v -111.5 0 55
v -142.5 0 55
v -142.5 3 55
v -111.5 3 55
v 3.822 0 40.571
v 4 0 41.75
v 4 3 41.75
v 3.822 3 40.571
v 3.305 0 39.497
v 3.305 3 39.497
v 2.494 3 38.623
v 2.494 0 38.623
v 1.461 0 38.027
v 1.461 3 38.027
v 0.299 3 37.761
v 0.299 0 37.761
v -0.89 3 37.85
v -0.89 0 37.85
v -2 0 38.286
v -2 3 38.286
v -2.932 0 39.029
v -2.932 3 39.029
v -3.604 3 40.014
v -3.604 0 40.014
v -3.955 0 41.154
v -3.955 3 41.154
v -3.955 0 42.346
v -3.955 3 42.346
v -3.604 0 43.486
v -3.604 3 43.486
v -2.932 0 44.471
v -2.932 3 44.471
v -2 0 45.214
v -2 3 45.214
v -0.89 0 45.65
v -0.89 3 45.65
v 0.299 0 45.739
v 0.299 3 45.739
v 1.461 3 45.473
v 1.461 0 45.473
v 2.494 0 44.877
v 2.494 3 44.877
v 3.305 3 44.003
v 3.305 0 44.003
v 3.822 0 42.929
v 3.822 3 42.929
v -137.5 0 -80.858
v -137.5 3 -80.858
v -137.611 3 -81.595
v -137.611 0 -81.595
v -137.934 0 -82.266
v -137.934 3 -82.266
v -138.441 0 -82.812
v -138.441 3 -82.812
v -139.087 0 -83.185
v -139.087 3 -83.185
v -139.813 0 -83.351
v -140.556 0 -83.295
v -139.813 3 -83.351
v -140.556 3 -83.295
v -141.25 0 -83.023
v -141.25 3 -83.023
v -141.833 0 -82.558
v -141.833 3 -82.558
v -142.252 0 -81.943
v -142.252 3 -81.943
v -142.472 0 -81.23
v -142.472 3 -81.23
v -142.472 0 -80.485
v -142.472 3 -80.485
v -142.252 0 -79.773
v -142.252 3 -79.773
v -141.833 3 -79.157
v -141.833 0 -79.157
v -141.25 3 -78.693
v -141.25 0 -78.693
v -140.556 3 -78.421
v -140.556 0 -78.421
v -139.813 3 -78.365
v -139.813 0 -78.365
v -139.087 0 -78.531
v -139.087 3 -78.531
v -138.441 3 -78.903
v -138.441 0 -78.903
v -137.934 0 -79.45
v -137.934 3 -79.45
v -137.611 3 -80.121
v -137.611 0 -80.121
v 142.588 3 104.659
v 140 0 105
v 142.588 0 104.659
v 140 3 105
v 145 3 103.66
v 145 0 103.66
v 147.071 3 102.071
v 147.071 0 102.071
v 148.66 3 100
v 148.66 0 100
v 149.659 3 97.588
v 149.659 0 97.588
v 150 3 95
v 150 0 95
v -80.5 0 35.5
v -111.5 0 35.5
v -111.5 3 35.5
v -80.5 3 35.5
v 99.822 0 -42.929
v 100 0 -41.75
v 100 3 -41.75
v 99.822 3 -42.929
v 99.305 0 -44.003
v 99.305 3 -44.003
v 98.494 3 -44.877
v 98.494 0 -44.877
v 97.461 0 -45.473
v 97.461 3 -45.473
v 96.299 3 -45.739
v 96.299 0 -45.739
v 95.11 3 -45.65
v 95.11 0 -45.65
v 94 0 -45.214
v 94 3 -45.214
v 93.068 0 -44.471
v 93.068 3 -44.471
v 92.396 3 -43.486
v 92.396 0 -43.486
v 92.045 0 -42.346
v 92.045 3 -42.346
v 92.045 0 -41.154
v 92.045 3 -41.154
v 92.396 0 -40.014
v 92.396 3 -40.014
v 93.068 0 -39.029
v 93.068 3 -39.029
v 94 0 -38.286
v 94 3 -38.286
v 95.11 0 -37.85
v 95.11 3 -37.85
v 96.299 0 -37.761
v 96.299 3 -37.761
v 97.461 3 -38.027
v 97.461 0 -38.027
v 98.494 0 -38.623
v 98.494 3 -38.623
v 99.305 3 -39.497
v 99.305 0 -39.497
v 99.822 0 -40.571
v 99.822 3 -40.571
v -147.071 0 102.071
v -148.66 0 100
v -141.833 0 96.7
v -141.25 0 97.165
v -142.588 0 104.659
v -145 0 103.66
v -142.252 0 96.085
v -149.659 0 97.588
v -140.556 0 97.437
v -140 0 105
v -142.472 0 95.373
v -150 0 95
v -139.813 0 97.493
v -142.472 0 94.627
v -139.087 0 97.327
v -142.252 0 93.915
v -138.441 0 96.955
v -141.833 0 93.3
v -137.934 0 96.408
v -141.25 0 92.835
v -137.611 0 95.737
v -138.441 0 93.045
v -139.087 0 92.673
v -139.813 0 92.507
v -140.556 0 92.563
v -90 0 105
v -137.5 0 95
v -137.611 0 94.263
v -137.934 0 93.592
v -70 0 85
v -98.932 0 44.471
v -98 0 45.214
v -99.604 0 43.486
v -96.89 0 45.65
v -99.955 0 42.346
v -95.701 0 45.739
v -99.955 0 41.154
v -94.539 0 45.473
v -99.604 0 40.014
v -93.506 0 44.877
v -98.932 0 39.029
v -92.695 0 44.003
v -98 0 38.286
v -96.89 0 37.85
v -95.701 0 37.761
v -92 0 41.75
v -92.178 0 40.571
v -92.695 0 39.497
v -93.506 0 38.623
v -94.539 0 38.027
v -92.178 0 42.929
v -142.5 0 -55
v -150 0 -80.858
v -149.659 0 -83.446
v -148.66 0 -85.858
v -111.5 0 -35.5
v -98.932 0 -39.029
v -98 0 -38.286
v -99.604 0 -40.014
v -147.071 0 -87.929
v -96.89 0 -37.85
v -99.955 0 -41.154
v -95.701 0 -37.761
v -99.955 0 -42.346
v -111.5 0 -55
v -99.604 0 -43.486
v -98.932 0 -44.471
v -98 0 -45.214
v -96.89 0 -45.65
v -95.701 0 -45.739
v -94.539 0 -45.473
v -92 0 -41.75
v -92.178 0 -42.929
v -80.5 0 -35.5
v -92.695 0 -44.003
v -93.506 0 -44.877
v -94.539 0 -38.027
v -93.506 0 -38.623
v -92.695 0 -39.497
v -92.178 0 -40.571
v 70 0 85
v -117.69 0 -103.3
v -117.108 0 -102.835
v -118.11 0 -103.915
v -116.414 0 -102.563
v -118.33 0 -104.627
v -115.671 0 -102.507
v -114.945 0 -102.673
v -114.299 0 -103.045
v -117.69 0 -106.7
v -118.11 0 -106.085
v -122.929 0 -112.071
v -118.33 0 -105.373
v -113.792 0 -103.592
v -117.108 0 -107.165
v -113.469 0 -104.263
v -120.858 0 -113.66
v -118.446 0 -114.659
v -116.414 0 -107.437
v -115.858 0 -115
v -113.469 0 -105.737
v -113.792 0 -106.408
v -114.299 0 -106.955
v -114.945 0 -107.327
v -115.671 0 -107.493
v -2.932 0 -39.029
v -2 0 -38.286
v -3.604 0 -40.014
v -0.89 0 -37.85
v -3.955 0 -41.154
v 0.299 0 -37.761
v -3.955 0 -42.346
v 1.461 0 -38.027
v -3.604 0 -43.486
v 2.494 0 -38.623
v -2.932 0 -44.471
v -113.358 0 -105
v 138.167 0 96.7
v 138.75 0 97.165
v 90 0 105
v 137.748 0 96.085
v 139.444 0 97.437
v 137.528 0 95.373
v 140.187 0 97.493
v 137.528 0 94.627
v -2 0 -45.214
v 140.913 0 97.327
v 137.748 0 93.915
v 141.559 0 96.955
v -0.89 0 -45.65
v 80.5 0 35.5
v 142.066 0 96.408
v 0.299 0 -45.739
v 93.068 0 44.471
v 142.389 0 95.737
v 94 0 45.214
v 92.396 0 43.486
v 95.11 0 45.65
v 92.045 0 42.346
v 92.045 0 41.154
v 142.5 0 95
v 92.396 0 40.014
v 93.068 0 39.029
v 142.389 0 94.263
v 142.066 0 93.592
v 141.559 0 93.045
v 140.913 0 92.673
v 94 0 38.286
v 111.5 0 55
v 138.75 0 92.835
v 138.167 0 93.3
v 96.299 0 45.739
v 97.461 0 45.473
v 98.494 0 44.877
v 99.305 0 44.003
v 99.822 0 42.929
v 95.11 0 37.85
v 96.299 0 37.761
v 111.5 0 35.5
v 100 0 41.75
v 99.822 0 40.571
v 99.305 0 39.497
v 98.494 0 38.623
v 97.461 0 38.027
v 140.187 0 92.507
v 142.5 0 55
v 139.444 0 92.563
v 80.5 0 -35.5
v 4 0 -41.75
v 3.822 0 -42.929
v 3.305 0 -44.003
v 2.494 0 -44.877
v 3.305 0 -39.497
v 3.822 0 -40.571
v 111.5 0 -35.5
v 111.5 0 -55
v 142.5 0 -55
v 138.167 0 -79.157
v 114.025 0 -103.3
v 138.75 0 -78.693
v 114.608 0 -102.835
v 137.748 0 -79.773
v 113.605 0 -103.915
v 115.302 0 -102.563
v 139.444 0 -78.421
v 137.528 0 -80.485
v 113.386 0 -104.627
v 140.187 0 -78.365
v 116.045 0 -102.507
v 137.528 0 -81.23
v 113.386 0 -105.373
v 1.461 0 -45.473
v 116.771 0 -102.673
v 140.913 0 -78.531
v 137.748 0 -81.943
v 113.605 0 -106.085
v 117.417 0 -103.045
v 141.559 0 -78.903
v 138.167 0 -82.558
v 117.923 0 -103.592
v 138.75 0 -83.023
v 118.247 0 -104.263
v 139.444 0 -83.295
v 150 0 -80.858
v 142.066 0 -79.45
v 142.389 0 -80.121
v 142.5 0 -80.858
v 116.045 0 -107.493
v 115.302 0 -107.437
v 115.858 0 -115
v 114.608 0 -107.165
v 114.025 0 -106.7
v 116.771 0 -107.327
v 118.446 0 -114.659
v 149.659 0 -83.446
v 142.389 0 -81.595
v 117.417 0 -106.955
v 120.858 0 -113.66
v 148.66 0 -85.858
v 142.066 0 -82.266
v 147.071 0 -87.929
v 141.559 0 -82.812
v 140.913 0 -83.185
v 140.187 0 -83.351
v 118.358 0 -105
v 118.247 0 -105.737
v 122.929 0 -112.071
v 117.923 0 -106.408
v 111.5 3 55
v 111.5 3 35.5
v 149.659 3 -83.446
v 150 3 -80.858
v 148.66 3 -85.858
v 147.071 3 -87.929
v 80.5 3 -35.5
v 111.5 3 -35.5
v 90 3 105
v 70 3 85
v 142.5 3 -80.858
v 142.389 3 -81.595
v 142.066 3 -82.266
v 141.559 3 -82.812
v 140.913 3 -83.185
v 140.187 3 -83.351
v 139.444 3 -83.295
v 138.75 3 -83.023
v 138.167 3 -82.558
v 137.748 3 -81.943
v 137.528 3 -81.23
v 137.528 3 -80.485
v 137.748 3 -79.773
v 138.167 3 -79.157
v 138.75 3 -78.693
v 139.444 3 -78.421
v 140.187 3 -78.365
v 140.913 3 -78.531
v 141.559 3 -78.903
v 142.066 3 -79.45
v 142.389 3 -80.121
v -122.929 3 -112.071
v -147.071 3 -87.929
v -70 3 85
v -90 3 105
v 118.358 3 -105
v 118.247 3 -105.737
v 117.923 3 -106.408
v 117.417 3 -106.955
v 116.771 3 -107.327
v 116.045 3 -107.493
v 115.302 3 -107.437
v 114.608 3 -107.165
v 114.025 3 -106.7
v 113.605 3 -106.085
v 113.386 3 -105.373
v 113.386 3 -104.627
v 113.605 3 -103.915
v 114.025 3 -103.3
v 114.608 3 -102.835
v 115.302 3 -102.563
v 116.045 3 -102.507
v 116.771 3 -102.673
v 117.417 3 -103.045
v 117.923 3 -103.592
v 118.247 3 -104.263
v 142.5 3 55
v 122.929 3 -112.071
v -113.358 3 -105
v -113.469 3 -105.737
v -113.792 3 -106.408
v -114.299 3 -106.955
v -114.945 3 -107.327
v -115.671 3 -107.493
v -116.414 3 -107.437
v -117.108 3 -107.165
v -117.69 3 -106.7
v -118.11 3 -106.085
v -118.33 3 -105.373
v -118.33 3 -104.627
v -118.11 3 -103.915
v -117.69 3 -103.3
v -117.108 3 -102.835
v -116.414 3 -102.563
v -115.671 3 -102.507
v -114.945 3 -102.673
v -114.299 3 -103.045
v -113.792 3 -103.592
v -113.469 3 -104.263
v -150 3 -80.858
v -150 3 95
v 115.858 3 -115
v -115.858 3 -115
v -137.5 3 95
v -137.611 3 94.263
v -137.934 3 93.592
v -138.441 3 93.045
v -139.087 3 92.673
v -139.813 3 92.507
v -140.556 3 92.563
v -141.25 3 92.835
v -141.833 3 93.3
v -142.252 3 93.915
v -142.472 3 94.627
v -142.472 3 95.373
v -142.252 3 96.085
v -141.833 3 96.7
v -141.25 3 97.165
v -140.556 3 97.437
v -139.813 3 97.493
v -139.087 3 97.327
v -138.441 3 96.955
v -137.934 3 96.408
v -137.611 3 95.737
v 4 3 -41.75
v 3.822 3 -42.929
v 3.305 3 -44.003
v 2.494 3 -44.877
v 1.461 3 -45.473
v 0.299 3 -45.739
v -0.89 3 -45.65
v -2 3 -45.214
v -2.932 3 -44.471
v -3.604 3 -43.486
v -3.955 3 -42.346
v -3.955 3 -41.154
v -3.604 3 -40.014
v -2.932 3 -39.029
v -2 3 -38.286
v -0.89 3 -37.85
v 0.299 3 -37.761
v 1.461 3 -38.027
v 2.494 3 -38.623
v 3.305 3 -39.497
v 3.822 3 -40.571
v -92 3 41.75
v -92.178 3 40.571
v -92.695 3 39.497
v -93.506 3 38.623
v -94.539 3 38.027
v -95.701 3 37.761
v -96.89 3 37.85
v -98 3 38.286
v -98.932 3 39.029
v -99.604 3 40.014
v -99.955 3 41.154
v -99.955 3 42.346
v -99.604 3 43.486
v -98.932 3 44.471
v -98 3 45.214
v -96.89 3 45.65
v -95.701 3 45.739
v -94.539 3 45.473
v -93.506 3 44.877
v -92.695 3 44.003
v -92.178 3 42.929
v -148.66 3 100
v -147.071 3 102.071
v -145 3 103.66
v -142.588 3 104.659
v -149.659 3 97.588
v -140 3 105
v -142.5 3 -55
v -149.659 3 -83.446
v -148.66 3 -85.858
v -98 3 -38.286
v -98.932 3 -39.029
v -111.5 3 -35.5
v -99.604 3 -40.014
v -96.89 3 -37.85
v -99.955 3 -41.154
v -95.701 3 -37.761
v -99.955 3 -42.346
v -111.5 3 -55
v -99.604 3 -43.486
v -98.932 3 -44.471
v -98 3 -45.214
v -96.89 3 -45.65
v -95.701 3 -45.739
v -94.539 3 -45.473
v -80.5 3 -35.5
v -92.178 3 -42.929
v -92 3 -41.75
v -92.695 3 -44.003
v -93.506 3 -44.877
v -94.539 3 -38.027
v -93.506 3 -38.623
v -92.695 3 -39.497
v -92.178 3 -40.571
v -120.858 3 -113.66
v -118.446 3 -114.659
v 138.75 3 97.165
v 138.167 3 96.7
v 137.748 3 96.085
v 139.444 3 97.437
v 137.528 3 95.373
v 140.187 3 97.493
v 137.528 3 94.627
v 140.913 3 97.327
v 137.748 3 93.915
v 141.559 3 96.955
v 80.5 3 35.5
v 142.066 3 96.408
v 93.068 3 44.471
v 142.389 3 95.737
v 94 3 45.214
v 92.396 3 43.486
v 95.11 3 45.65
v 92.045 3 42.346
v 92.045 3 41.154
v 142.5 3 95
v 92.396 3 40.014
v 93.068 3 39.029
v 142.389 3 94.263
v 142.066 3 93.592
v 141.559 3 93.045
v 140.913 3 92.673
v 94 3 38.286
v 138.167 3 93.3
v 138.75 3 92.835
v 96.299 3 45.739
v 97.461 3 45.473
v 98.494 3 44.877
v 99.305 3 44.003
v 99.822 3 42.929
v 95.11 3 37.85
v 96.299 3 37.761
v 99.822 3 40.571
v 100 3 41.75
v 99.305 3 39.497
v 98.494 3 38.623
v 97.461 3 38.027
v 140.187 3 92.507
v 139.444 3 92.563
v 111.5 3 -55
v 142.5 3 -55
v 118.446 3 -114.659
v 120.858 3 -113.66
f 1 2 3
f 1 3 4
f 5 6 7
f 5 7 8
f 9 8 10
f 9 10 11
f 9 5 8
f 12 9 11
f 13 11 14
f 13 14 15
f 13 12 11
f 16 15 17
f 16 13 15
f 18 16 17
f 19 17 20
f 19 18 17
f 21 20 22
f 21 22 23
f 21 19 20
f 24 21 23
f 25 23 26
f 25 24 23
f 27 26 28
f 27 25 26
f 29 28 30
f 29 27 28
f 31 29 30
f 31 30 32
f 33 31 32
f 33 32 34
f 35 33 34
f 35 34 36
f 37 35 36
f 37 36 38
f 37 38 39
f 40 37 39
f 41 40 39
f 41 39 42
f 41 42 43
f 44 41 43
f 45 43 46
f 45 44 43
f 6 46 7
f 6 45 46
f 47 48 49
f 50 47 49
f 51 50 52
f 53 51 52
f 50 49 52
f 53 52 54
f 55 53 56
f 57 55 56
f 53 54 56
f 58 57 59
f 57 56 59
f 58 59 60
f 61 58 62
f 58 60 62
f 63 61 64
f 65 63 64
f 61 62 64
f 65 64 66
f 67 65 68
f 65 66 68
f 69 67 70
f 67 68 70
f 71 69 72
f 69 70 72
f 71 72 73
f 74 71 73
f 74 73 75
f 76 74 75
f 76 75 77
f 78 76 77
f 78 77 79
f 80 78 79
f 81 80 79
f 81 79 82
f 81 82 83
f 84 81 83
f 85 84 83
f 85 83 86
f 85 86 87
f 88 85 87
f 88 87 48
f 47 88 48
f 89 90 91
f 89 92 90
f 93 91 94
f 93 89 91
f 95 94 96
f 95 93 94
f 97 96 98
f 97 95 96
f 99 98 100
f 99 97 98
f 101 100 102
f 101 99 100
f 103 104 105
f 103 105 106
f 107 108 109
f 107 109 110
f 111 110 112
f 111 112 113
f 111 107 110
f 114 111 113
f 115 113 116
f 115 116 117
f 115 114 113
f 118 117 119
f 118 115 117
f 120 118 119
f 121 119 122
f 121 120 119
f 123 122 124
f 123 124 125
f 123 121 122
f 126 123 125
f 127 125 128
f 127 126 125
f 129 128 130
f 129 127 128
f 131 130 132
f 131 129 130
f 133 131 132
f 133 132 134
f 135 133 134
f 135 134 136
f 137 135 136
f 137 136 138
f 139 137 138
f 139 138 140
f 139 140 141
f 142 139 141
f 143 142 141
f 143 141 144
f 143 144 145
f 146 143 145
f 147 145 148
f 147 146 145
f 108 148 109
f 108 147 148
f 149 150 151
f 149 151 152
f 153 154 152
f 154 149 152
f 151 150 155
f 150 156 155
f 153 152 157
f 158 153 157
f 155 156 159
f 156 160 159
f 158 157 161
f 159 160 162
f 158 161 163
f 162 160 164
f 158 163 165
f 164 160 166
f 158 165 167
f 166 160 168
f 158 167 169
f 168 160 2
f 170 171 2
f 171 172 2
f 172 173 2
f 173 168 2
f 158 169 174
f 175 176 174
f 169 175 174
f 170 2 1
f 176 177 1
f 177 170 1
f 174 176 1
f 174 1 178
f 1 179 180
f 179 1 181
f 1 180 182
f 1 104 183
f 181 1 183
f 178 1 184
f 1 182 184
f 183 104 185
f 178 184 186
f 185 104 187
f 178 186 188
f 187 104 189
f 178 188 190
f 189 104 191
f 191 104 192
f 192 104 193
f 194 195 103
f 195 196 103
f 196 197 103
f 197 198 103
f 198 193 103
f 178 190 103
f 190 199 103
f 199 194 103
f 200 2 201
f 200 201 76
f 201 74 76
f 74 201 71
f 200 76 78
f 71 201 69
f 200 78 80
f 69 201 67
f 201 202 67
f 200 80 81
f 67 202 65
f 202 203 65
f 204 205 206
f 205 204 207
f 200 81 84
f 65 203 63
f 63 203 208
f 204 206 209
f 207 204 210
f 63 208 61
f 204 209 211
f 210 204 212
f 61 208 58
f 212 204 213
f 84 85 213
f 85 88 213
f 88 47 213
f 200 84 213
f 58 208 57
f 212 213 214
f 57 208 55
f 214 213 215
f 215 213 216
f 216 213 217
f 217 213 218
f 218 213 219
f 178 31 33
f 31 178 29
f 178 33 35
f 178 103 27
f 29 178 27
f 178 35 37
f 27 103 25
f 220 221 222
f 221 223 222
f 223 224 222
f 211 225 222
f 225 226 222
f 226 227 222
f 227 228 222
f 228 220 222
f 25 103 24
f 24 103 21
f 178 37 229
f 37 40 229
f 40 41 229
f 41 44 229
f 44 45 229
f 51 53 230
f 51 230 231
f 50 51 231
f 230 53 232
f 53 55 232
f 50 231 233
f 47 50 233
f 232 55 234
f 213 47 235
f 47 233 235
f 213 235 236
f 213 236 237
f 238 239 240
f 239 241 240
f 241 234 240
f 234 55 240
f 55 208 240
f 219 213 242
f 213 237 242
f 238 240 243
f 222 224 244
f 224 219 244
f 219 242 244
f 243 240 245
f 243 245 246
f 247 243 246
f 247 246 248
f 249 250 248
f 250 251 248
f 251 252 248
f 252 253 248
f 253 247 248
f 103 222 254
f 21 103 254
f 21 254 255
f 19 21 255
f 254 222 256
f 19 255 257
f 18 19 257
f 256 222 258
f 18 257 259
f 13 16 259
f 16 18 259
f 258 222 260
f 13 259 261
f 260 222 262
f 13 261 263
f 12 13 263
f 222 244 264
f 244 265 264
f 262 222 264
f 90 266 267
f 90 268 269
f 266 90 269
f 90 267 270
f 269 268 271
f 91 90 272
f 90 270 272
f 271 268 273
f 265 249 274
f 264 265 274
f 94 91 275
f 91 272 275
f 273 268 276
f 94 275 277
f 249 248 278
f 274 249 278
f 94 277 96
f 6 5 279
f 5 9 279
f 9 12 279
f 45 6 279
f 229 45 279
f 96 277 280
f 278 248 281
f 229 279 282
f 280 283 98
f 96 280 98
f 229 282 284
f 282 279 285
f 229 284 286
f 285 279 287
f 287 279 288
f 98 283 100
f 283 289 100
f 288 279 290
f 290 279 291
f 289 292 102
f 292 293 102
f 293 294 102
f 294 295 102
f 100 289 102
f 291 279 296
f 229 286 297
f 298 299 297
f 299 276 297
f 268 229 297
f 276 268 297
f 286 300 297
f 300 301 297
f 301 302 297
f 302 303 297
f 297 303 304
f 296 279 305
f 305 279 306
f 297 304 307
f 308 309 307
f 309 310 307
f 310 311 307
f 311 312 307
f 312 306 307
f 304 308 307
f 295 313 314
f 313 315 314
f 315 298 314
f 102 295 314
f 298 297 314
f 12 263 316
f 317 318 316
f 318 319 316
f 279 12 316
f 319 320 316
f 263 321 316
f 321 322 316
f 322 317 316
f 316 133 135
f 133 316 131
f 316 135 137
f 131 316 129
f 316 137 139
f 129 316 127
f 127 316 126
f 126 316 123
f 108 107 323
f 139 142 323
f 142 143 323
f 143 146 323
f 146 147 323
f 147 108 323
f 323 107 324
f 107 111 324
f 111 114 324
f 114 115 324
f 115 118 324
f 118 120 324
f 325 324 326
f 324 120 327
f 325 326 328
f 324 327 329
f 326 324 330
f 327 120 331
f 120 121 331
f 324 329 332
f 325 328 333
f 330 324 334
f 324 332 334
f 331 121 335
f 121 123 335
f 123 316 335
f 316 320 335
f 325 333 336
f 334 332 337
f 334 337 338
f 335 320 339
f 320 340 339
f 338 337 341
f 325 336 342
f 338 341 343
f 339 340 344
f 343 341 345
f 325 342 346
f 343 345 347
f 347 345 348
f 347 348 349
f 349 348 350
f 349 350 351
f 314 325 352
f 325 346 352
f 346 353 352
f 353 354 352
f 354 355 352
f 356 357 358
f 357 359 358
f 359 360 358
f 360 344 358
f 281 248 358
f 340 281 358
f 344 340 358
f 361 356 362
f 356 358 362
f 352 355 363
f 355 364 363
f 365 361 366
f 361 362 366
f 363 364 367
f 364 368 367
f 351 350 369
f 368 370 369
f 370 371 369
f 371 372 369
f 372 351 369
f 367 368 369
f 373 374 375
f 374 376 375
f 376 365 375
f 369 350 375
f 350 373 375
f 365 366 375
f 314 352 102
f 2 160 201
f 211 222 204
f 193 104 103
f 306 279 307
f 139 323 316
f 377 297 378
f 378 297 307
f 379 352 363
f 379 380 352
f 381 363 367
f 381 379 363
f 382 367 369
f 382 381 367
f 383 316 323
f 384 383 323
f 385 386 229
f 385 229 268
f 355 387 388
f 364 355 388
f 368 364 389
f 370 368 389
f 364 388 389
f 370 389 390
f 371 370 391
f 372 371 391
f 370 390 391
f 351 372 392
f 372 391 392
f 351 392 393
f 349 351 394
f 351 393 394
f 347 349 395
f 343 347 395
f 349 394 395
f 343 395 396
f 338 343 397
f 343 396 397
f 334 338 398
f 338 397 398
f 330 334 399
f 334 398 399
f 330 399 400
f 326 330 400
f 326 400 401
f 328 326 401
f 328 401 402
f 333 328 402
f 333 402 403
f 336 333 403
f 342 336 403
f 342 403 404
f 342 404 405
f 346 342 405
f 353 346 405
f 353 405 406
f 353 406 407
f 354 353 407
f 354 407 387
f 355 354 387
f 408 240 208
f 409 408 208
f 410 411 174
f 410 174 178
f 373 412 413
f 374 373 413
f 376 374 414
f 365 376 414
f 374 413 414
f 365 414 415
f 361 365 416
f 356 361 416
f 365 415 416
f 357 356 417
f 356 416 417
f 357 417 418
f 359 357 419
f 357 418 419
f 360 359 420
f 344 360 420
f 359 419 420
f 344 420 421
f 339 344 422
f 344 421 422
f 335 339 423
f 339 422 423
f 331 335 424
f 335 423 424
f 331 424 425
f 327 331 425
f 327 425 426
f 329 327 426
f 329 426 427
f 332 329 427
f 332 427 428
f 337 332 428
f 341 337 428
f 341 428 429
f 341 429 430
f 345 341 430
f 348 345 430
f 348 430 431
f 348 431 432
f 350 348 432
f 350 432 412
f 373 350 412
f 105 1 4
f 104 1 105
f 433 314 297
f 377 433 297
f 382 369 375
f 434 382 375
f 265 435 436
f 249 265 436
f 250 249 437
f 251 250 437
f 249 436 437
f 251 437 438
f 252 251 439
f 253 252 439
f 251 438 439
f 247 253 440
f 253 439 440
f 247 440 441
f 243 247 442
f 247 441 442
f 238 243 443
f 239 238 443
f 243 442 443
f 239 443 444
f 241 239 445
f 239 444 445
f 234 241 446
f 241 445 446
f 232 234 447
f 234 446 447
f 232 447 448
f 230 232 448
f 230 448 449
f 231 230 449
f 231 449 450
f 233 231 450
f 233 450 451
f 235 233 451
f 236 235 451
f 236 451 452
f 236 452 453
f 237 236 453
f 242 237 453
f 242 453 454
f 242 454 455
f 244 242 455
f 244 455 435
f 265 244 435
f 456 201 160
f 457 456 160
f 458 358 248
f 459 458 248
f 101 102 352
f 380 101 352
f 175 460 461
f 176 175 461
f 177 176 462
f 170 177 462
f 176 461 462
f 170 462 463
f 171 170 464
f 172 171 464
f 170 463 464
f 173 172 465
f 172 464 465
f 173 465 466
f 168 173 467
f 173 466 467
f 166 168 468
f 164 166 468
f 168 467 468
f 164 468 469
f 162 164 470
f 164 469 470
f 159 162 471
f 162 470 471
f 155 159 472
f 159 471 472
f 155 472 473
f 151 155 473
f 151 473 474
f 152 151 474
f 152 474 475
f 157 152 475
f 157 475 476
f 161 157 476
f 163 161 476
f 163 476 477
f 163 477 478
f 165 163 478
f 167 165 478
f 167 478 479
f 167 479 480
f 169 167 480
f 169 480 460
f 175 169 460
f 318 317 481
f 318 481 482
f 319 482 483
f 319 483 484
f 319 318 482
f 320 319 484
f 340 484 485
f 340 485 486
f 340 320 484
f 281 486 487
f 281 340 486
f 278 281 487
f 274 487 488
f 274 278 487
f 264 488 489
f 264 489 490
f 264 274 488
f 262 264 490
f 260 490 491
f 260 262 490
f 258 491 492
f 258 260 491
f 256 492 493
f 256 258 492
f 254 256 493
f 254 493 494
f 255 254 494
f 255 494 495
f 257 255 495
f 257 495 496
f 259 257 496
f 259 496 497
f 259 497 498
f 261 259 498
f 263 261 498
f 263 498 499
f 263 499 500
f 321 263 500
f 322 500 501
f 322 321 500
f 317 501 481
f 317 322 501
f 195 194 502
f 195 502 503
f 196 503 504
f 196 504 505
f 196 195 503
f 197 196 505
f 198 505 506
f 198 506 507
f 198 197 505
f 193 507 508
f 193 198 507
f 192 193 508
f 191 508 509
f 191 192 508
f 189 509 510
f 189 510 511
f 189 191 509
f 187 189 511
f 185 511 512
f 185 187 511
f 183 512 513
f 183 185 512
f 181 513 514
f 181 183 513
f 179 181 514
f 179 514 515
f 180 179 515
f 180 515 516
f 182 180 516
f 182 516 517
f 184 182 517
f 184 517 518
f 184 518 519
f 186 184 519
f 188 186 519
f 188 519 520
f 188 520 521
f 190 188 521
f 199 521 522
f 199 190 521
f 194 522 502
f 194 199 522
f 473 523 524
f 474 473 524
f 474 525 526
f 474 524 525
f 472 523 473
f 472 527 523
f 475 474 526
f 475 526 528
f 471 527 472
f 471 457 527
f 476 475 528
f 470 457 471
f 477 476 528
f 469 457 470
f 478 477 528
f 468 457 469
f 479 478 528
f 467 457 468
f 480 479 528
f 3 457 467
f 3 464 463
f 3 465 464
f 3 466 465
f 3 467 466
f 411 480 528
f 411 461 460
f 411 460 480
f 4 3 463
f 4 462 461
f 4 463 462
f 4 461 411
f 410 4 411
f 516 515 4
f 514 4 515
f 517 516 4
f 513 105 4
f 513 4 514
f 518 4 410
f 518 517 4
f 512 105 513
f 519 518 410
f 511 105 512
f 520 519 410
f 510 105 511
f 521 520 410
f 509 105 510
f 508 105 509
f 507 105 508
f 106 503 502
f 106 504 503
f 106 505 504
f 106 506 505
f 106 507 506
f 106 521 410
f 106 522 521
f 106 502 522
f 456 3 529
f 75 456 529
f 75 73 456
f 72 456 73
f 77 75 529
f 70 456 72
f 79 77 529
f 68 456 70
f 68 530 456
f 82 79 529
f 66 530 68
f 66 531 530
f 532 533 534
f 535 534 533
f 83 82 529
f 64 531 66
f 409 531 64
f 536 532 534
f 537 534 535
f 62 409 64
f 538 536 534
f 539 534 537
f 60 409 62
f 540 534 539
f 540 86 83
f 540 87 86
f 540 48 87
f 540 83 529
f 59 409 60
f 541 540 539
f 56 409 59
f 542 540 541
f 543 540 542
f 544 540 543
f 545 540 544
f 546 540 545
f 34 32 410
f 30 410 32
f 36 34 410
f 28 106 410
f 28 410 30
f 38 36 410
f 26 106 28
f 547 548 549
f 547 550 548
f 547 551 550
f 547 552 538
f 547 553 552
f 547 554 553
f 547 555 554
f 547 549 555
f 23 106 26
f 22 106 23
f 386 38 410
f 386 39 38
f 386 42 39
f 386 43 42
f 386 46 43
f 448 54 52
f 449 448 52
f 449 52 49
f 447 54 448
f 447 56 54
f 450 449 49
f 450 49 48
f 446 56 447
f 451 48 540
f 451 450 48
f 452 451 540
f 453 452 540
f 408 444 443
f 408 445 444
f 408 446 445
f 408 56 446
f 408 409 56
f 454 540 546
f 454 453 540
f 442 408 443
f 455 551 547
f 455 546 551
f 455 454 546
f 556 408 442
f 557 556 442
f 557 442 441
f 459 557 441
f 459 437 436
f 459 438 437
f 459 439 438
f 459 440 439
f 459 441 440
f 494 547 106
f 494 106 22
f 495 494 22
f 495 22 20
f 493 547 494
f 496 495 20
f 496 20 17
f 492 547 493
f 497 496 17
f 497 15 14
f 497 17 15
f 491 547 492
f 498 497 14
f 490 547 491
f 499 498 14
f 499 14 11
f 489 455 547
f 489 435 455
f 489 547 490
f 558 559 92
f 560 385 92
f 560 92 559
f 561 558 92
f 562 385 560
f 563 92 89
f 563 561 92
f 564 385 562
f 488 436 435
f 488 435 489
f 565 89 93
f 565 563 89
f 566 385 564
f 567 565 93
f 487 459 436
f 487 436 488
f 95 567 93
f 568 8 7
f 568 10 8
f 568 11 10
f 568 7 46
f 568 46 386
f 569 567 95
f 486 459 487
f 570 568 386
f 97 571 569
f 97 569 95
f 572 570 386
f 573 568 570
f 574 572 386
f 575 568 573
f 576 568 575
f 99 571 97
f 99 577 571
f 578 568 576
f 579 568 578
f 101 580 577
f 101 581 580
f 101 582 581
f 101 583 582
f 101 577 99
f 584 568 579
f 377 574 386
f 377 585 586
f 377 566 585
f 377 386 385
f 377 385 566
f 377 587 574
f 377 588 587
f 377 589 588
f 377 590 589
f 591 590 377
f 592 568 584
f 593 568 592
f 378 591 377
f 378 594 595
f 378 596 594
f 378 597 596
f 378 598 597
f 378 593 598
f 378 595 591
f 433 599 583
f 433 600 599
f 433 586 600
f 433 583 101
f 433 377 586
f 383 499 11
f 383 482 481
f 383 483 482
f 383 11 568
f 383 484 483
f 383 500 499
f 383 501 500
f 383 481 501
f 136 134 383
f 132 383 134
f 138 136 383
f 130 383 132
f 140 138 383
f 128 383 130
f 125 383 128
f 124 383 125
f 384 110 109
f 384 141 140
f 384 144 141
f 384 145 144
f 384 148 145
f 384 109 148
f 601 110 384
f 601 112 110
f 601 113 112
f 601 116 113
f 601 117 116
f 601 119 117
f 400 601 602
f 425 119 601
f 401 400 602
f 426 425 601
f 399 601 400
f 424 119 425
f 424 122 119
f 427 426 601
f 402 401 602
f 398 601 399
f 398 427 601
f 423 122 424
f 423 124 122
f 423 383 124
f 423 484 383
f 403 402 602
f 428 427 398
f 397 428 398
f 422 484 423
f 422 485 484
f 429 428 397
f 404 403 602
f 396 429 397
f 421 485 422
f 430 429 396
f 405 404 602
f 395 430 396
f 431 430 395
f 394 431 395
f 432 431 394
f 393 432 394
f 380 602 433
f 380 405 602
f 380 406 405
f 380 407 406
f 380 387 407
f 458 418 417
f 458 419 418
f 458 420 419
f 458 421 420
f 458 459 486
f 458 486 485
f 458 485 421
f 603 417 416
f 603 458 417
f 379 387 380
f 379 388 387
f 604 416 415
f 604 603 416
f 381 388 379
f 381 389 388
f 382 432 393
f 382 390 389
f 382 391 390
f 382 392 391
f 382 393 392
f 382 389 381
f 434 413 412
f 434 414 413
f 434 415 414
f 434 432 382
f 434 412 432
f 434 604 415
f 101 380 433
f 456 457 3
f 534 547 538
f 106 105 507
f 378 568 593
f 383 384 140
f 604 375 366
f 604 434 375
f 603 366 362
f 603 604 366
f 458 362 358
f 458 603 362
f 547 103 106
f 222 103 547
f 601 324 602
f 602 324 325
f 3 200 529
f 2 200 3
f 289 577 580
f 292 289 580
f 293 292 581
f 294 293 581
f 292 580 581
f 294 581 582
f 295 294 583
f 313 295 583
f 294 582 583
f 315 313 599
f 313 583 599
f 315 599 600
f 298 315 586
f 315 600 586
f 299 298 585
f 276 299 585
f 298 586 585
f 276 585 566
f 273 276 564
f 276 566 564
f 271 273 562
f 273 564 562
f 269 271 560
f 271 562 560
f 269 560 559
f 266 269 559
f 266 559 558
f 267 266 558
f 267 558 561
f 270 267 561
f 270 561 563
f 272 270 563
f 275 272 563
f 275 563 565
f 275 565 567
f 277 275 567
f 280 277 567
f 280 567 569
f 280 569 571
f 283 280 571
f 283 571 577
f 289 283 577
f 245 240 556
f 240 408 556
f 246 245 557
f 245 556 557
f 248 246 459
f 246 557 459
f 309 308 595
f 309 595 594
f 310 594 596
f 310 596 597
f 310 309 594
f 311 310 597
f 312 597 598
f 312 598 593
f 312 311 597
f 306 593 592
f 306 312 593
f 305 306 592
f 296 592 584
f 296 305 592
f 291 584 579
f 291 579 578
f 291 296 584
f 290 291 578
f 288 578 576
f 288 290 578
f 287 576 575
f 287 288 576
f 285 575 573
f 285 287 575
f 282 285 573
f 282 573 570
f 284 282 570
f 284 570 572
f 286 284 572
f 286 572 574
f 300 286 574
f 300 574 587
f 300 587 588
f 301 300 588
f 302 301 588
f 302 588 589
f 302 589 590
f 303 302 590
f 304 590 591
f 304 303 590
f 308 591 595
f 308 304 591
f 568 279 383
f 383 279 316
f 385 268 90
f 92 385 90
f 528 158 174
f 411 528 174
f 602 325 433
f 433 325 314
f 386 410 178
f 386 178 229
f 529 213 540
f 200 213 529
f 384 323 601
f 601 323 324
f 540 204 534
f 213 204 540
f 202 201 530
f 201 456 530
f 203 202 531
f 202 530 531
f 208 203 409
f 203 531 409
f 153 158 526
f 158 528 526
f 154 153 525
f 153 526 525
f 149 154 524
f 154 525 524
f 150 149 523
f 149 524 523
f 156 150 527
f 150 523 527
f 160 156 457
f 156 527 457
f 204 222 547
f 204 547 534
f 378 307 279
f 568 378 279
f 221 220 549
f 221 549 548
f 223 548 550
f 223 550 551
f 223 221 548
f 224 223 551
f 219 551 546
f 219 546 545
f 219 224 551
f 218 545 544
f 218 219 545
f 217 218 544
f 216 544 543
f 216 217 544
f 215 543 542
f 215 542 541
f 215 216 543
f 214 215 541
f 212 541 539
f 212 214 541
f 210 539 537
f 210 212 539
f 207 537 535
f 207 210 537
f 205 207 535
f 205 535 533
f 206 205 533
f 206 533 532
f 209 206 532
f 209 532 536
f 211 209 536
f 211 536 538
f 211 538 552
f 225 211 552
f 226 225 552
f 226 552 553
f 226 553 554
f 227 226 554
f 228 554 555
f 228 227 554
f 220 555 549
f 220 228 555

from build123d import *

# Parameters (mm, degrees)
ESQUISSE1_R      = 4
EXTRUSION1_DEPTH = 3
CONG_2_R         = 10
EXTRUSION2_REACH = 5
ESQUISSE3_R      = 2.5
EXTRUSION3_REACH = 5


with BuildPart() as part:
    # Esquisse1 → Extrusion1 (new body)
    with BuildSketch(Plane(origin=(0, 0, 0), x_dir=(1, 0, 0), z_dir=(0, 1, 0))):
        Polygon((-150, -105), (150, -105), (150, 0), (150, 85), (120, 115), (-120, 115), (-150, 85), (-150, 0), align=None)
        with Locations((0, 41.75)):
            Circle(ESQUISSE1_R, mode=Mode.SUBTRACT)
        with Locations((-96, 41.75)):
            Circle(ESQUISSE1_R, mode=Mode.SUBTRACT)
        with Locations((0, -41.75)):
            Circle(ESQUISSE1_R, mode=Mode.SUBTRACT)
        with Locations((-96, -41.75)):
            Circle(ESQUISSE1_R, mode=Mode.SUBTRACT)
        with Locations((96, -41.75)):
            Circle(ESQUISSE1_R, mode=Mode.SUBTRACT)
        with Locations((96, 41.75)):
            Circle(ESQUISSE1_R, mode=Mode.SUBTRACT)
        Polygon((-142.5, 55), (-142.5, -55), (-111.5, -55), (-111.5, -35.5), (-80.5, -35.5), (-80.5, 35.5), (-111.5, 35.5), (-111.5, 55), align=None, mode=Mode.SUBTRACT)
        Polygon((111.5, 55), (142.5, 55), (142.5, -55), (111.5, -55), (111.5, -35.5), (80.5, -35.5), (80.5, 35.5), (111.5, 35.5), align=None, mode=Mode.SUBTRACT)
    extrude(amount=EXTRUSION1_DEPTH)

    # Congé2
    cong_2_edges = [part.edges().sort_by_distance(p)[0] for p in [
        (150, 1.5, -85),
        (150, 1.5, 105),
        (-150, 1.5, 105),
        (-150, 1.5, -85),
        (-120, 1.5, -115),
        (120, 1.5, -115),
    ]]
    fillet(cong_2_edges, radius=CONG_2_R)

    # Esquisse3 → Extrusion2 (cut, up to next)
    with BuildSketch(Plane(origin=(0, 3, 0), x_dir=(1, 0, 0), z_dir=(0, 1, 0)), mode=Mode.PRIVATE) as extrusion2_sk1:
        with Locations((-140, -95)):
            Circle(ESQUISSE3_R)
    extrusion2_tool1 = extrude(extrusion2_sk1.sketch, amount=-EXTRUSION2_REACH, mode=Mode.PRIVATE) & part.part
    add(extrusion2_tool1.solids().sort_by_distance((-140, 3, 95))[0], mode=Mode.SUBTRACT)
    # Esquisse3 → Extrusion2 (cut, up to next)
    with BuildSketch(Plane(origin=(0, 3, 0), x_dir=(1, 0, 0), z_dir=(0, 1, 0)), mode=Mode.PRIVATE) as extrusion2_sk2:
        with Locations((-140, 80.857864376)):
            Circle(ESQUISSE3_R)
    extrusion2_tool2 = extrude(extrusion2_sk2.sketch, amount=-EXTRUSION2_REACH, mode=Mode.PRIVATE) & part.part
    add(extrusion2_tool2.solids().sort_by_distance((-140, 3, -80.857864))[0], mode=Mode.SUBTRACT)
    # Esquisse3 → Extrusion2 (cut, up to next)
    with BuildSketch(Plane(origin=(0, 3, 0), x_dir=(1, 0, 0), z_dir=(0, 1, 0)), mode=Mode.PRIVATE) as extrusion2_sk3:
        with Locations((-115.857864376, 105)):
            Circle(ESQUISSE3_R)
    extrusion2_tool3 = extrude(extrusion2_sk3.sketch, amount=-EXTRUSION2_REACH, mode=Mode.PRIVATE) & part.part
    add(extrusion2_tool3.solids().sort_by_distance((-115.857864, 3, -105))[0], mode=Mode.SUBTRACT)
    # Esquisse3 → Extrusion2 (cut, up to next)
    with BuildSketch(Plane(origin=(0, 3, 0), x_dir=(1, 0, 0), z_dir=(0, 1, 0)), mode=Mode.PRIVATE) as extrusion2_sk4:
        with Locations((140, -95)):
            Circle(ESQUISSE3_R)
    extrusion2_tool4 = extrude(extrusion2_sk4.sketch, amount=-EXTRUSION2_REACH, mode=Mode.PRIVATE) & part.part
    add(extrusion2_tool4.solids().sort_by_distance((140, 3, 95))[0], mode=Mode.SUBTRACT)
    # Esquisse3 → Extrusion2 (cut, up to next)
    with BuildSketch(Plane(origin=(0, 3, 0), x_dir=(1, 0, 0), z_dir=(0, 1, 0)), mode=Mode.PRIVATE) as extrusion2_sk5:
        with Locations((140, 80.857864376)):
            Circle(ESQUISSE3_R)
    extrusion2_tool5 = extrude(extrusion2_sk5.sketch, amount=-EXTRUSION2_REACH, mode=Mode.PRIVATE) & part.part
    add(extrusion2_tool5.solids().sort_by_distance((140, 3, -80.857864))[0], mode=Mode.SUBTRACT)
    # Esquisse3 → Extrusion2 (cut, up to next)
    with BuildSketch(Plane(origin=(0, 3, 0), x_dir=(1, 0, 0), z_dir=(0, 1, 0)), mode=Mode.PRIVATE) as extrusion2_sk6:
        with Locations((115.857864376, 105)):
            Circle(ESQUISSE3_R)
    extrusion2_tool6 = extrude(extrusion2_sk6.sketch, amount=-EXTRUSION2_REACH, mode=Mode.PRIVATE) & part.part
    add(extrusion2_tool6.solids().sort_by_distance((115.857864, 3, -105))[0], mode=Mode.SUBTRACT)

    # Esquisse4 → Extrusion3 (cut, up to next)
    with BuildSketch(Plane(origin=(0, 3, 0), x_dir=(1, 0, 0), z_dir=(0, 1, 0)), mode=Mode.PRIVATE) as extrusion3_sk1:
        Polygon((-90, -105), (-70, -85), (70, -85), (90, -105), align=None)
    extrusion3_tool1 = extrude(extrusion3_sk1.sketch, amount=-EXTRUSION3_REACH, mode=Mode.PRIVATE) & part.part
    add(extrusion3_tool1.solids().sort_by_distance((0, 3, 95.416667))[0], mode=Mode.SUBTRACT)


solid = part.part
